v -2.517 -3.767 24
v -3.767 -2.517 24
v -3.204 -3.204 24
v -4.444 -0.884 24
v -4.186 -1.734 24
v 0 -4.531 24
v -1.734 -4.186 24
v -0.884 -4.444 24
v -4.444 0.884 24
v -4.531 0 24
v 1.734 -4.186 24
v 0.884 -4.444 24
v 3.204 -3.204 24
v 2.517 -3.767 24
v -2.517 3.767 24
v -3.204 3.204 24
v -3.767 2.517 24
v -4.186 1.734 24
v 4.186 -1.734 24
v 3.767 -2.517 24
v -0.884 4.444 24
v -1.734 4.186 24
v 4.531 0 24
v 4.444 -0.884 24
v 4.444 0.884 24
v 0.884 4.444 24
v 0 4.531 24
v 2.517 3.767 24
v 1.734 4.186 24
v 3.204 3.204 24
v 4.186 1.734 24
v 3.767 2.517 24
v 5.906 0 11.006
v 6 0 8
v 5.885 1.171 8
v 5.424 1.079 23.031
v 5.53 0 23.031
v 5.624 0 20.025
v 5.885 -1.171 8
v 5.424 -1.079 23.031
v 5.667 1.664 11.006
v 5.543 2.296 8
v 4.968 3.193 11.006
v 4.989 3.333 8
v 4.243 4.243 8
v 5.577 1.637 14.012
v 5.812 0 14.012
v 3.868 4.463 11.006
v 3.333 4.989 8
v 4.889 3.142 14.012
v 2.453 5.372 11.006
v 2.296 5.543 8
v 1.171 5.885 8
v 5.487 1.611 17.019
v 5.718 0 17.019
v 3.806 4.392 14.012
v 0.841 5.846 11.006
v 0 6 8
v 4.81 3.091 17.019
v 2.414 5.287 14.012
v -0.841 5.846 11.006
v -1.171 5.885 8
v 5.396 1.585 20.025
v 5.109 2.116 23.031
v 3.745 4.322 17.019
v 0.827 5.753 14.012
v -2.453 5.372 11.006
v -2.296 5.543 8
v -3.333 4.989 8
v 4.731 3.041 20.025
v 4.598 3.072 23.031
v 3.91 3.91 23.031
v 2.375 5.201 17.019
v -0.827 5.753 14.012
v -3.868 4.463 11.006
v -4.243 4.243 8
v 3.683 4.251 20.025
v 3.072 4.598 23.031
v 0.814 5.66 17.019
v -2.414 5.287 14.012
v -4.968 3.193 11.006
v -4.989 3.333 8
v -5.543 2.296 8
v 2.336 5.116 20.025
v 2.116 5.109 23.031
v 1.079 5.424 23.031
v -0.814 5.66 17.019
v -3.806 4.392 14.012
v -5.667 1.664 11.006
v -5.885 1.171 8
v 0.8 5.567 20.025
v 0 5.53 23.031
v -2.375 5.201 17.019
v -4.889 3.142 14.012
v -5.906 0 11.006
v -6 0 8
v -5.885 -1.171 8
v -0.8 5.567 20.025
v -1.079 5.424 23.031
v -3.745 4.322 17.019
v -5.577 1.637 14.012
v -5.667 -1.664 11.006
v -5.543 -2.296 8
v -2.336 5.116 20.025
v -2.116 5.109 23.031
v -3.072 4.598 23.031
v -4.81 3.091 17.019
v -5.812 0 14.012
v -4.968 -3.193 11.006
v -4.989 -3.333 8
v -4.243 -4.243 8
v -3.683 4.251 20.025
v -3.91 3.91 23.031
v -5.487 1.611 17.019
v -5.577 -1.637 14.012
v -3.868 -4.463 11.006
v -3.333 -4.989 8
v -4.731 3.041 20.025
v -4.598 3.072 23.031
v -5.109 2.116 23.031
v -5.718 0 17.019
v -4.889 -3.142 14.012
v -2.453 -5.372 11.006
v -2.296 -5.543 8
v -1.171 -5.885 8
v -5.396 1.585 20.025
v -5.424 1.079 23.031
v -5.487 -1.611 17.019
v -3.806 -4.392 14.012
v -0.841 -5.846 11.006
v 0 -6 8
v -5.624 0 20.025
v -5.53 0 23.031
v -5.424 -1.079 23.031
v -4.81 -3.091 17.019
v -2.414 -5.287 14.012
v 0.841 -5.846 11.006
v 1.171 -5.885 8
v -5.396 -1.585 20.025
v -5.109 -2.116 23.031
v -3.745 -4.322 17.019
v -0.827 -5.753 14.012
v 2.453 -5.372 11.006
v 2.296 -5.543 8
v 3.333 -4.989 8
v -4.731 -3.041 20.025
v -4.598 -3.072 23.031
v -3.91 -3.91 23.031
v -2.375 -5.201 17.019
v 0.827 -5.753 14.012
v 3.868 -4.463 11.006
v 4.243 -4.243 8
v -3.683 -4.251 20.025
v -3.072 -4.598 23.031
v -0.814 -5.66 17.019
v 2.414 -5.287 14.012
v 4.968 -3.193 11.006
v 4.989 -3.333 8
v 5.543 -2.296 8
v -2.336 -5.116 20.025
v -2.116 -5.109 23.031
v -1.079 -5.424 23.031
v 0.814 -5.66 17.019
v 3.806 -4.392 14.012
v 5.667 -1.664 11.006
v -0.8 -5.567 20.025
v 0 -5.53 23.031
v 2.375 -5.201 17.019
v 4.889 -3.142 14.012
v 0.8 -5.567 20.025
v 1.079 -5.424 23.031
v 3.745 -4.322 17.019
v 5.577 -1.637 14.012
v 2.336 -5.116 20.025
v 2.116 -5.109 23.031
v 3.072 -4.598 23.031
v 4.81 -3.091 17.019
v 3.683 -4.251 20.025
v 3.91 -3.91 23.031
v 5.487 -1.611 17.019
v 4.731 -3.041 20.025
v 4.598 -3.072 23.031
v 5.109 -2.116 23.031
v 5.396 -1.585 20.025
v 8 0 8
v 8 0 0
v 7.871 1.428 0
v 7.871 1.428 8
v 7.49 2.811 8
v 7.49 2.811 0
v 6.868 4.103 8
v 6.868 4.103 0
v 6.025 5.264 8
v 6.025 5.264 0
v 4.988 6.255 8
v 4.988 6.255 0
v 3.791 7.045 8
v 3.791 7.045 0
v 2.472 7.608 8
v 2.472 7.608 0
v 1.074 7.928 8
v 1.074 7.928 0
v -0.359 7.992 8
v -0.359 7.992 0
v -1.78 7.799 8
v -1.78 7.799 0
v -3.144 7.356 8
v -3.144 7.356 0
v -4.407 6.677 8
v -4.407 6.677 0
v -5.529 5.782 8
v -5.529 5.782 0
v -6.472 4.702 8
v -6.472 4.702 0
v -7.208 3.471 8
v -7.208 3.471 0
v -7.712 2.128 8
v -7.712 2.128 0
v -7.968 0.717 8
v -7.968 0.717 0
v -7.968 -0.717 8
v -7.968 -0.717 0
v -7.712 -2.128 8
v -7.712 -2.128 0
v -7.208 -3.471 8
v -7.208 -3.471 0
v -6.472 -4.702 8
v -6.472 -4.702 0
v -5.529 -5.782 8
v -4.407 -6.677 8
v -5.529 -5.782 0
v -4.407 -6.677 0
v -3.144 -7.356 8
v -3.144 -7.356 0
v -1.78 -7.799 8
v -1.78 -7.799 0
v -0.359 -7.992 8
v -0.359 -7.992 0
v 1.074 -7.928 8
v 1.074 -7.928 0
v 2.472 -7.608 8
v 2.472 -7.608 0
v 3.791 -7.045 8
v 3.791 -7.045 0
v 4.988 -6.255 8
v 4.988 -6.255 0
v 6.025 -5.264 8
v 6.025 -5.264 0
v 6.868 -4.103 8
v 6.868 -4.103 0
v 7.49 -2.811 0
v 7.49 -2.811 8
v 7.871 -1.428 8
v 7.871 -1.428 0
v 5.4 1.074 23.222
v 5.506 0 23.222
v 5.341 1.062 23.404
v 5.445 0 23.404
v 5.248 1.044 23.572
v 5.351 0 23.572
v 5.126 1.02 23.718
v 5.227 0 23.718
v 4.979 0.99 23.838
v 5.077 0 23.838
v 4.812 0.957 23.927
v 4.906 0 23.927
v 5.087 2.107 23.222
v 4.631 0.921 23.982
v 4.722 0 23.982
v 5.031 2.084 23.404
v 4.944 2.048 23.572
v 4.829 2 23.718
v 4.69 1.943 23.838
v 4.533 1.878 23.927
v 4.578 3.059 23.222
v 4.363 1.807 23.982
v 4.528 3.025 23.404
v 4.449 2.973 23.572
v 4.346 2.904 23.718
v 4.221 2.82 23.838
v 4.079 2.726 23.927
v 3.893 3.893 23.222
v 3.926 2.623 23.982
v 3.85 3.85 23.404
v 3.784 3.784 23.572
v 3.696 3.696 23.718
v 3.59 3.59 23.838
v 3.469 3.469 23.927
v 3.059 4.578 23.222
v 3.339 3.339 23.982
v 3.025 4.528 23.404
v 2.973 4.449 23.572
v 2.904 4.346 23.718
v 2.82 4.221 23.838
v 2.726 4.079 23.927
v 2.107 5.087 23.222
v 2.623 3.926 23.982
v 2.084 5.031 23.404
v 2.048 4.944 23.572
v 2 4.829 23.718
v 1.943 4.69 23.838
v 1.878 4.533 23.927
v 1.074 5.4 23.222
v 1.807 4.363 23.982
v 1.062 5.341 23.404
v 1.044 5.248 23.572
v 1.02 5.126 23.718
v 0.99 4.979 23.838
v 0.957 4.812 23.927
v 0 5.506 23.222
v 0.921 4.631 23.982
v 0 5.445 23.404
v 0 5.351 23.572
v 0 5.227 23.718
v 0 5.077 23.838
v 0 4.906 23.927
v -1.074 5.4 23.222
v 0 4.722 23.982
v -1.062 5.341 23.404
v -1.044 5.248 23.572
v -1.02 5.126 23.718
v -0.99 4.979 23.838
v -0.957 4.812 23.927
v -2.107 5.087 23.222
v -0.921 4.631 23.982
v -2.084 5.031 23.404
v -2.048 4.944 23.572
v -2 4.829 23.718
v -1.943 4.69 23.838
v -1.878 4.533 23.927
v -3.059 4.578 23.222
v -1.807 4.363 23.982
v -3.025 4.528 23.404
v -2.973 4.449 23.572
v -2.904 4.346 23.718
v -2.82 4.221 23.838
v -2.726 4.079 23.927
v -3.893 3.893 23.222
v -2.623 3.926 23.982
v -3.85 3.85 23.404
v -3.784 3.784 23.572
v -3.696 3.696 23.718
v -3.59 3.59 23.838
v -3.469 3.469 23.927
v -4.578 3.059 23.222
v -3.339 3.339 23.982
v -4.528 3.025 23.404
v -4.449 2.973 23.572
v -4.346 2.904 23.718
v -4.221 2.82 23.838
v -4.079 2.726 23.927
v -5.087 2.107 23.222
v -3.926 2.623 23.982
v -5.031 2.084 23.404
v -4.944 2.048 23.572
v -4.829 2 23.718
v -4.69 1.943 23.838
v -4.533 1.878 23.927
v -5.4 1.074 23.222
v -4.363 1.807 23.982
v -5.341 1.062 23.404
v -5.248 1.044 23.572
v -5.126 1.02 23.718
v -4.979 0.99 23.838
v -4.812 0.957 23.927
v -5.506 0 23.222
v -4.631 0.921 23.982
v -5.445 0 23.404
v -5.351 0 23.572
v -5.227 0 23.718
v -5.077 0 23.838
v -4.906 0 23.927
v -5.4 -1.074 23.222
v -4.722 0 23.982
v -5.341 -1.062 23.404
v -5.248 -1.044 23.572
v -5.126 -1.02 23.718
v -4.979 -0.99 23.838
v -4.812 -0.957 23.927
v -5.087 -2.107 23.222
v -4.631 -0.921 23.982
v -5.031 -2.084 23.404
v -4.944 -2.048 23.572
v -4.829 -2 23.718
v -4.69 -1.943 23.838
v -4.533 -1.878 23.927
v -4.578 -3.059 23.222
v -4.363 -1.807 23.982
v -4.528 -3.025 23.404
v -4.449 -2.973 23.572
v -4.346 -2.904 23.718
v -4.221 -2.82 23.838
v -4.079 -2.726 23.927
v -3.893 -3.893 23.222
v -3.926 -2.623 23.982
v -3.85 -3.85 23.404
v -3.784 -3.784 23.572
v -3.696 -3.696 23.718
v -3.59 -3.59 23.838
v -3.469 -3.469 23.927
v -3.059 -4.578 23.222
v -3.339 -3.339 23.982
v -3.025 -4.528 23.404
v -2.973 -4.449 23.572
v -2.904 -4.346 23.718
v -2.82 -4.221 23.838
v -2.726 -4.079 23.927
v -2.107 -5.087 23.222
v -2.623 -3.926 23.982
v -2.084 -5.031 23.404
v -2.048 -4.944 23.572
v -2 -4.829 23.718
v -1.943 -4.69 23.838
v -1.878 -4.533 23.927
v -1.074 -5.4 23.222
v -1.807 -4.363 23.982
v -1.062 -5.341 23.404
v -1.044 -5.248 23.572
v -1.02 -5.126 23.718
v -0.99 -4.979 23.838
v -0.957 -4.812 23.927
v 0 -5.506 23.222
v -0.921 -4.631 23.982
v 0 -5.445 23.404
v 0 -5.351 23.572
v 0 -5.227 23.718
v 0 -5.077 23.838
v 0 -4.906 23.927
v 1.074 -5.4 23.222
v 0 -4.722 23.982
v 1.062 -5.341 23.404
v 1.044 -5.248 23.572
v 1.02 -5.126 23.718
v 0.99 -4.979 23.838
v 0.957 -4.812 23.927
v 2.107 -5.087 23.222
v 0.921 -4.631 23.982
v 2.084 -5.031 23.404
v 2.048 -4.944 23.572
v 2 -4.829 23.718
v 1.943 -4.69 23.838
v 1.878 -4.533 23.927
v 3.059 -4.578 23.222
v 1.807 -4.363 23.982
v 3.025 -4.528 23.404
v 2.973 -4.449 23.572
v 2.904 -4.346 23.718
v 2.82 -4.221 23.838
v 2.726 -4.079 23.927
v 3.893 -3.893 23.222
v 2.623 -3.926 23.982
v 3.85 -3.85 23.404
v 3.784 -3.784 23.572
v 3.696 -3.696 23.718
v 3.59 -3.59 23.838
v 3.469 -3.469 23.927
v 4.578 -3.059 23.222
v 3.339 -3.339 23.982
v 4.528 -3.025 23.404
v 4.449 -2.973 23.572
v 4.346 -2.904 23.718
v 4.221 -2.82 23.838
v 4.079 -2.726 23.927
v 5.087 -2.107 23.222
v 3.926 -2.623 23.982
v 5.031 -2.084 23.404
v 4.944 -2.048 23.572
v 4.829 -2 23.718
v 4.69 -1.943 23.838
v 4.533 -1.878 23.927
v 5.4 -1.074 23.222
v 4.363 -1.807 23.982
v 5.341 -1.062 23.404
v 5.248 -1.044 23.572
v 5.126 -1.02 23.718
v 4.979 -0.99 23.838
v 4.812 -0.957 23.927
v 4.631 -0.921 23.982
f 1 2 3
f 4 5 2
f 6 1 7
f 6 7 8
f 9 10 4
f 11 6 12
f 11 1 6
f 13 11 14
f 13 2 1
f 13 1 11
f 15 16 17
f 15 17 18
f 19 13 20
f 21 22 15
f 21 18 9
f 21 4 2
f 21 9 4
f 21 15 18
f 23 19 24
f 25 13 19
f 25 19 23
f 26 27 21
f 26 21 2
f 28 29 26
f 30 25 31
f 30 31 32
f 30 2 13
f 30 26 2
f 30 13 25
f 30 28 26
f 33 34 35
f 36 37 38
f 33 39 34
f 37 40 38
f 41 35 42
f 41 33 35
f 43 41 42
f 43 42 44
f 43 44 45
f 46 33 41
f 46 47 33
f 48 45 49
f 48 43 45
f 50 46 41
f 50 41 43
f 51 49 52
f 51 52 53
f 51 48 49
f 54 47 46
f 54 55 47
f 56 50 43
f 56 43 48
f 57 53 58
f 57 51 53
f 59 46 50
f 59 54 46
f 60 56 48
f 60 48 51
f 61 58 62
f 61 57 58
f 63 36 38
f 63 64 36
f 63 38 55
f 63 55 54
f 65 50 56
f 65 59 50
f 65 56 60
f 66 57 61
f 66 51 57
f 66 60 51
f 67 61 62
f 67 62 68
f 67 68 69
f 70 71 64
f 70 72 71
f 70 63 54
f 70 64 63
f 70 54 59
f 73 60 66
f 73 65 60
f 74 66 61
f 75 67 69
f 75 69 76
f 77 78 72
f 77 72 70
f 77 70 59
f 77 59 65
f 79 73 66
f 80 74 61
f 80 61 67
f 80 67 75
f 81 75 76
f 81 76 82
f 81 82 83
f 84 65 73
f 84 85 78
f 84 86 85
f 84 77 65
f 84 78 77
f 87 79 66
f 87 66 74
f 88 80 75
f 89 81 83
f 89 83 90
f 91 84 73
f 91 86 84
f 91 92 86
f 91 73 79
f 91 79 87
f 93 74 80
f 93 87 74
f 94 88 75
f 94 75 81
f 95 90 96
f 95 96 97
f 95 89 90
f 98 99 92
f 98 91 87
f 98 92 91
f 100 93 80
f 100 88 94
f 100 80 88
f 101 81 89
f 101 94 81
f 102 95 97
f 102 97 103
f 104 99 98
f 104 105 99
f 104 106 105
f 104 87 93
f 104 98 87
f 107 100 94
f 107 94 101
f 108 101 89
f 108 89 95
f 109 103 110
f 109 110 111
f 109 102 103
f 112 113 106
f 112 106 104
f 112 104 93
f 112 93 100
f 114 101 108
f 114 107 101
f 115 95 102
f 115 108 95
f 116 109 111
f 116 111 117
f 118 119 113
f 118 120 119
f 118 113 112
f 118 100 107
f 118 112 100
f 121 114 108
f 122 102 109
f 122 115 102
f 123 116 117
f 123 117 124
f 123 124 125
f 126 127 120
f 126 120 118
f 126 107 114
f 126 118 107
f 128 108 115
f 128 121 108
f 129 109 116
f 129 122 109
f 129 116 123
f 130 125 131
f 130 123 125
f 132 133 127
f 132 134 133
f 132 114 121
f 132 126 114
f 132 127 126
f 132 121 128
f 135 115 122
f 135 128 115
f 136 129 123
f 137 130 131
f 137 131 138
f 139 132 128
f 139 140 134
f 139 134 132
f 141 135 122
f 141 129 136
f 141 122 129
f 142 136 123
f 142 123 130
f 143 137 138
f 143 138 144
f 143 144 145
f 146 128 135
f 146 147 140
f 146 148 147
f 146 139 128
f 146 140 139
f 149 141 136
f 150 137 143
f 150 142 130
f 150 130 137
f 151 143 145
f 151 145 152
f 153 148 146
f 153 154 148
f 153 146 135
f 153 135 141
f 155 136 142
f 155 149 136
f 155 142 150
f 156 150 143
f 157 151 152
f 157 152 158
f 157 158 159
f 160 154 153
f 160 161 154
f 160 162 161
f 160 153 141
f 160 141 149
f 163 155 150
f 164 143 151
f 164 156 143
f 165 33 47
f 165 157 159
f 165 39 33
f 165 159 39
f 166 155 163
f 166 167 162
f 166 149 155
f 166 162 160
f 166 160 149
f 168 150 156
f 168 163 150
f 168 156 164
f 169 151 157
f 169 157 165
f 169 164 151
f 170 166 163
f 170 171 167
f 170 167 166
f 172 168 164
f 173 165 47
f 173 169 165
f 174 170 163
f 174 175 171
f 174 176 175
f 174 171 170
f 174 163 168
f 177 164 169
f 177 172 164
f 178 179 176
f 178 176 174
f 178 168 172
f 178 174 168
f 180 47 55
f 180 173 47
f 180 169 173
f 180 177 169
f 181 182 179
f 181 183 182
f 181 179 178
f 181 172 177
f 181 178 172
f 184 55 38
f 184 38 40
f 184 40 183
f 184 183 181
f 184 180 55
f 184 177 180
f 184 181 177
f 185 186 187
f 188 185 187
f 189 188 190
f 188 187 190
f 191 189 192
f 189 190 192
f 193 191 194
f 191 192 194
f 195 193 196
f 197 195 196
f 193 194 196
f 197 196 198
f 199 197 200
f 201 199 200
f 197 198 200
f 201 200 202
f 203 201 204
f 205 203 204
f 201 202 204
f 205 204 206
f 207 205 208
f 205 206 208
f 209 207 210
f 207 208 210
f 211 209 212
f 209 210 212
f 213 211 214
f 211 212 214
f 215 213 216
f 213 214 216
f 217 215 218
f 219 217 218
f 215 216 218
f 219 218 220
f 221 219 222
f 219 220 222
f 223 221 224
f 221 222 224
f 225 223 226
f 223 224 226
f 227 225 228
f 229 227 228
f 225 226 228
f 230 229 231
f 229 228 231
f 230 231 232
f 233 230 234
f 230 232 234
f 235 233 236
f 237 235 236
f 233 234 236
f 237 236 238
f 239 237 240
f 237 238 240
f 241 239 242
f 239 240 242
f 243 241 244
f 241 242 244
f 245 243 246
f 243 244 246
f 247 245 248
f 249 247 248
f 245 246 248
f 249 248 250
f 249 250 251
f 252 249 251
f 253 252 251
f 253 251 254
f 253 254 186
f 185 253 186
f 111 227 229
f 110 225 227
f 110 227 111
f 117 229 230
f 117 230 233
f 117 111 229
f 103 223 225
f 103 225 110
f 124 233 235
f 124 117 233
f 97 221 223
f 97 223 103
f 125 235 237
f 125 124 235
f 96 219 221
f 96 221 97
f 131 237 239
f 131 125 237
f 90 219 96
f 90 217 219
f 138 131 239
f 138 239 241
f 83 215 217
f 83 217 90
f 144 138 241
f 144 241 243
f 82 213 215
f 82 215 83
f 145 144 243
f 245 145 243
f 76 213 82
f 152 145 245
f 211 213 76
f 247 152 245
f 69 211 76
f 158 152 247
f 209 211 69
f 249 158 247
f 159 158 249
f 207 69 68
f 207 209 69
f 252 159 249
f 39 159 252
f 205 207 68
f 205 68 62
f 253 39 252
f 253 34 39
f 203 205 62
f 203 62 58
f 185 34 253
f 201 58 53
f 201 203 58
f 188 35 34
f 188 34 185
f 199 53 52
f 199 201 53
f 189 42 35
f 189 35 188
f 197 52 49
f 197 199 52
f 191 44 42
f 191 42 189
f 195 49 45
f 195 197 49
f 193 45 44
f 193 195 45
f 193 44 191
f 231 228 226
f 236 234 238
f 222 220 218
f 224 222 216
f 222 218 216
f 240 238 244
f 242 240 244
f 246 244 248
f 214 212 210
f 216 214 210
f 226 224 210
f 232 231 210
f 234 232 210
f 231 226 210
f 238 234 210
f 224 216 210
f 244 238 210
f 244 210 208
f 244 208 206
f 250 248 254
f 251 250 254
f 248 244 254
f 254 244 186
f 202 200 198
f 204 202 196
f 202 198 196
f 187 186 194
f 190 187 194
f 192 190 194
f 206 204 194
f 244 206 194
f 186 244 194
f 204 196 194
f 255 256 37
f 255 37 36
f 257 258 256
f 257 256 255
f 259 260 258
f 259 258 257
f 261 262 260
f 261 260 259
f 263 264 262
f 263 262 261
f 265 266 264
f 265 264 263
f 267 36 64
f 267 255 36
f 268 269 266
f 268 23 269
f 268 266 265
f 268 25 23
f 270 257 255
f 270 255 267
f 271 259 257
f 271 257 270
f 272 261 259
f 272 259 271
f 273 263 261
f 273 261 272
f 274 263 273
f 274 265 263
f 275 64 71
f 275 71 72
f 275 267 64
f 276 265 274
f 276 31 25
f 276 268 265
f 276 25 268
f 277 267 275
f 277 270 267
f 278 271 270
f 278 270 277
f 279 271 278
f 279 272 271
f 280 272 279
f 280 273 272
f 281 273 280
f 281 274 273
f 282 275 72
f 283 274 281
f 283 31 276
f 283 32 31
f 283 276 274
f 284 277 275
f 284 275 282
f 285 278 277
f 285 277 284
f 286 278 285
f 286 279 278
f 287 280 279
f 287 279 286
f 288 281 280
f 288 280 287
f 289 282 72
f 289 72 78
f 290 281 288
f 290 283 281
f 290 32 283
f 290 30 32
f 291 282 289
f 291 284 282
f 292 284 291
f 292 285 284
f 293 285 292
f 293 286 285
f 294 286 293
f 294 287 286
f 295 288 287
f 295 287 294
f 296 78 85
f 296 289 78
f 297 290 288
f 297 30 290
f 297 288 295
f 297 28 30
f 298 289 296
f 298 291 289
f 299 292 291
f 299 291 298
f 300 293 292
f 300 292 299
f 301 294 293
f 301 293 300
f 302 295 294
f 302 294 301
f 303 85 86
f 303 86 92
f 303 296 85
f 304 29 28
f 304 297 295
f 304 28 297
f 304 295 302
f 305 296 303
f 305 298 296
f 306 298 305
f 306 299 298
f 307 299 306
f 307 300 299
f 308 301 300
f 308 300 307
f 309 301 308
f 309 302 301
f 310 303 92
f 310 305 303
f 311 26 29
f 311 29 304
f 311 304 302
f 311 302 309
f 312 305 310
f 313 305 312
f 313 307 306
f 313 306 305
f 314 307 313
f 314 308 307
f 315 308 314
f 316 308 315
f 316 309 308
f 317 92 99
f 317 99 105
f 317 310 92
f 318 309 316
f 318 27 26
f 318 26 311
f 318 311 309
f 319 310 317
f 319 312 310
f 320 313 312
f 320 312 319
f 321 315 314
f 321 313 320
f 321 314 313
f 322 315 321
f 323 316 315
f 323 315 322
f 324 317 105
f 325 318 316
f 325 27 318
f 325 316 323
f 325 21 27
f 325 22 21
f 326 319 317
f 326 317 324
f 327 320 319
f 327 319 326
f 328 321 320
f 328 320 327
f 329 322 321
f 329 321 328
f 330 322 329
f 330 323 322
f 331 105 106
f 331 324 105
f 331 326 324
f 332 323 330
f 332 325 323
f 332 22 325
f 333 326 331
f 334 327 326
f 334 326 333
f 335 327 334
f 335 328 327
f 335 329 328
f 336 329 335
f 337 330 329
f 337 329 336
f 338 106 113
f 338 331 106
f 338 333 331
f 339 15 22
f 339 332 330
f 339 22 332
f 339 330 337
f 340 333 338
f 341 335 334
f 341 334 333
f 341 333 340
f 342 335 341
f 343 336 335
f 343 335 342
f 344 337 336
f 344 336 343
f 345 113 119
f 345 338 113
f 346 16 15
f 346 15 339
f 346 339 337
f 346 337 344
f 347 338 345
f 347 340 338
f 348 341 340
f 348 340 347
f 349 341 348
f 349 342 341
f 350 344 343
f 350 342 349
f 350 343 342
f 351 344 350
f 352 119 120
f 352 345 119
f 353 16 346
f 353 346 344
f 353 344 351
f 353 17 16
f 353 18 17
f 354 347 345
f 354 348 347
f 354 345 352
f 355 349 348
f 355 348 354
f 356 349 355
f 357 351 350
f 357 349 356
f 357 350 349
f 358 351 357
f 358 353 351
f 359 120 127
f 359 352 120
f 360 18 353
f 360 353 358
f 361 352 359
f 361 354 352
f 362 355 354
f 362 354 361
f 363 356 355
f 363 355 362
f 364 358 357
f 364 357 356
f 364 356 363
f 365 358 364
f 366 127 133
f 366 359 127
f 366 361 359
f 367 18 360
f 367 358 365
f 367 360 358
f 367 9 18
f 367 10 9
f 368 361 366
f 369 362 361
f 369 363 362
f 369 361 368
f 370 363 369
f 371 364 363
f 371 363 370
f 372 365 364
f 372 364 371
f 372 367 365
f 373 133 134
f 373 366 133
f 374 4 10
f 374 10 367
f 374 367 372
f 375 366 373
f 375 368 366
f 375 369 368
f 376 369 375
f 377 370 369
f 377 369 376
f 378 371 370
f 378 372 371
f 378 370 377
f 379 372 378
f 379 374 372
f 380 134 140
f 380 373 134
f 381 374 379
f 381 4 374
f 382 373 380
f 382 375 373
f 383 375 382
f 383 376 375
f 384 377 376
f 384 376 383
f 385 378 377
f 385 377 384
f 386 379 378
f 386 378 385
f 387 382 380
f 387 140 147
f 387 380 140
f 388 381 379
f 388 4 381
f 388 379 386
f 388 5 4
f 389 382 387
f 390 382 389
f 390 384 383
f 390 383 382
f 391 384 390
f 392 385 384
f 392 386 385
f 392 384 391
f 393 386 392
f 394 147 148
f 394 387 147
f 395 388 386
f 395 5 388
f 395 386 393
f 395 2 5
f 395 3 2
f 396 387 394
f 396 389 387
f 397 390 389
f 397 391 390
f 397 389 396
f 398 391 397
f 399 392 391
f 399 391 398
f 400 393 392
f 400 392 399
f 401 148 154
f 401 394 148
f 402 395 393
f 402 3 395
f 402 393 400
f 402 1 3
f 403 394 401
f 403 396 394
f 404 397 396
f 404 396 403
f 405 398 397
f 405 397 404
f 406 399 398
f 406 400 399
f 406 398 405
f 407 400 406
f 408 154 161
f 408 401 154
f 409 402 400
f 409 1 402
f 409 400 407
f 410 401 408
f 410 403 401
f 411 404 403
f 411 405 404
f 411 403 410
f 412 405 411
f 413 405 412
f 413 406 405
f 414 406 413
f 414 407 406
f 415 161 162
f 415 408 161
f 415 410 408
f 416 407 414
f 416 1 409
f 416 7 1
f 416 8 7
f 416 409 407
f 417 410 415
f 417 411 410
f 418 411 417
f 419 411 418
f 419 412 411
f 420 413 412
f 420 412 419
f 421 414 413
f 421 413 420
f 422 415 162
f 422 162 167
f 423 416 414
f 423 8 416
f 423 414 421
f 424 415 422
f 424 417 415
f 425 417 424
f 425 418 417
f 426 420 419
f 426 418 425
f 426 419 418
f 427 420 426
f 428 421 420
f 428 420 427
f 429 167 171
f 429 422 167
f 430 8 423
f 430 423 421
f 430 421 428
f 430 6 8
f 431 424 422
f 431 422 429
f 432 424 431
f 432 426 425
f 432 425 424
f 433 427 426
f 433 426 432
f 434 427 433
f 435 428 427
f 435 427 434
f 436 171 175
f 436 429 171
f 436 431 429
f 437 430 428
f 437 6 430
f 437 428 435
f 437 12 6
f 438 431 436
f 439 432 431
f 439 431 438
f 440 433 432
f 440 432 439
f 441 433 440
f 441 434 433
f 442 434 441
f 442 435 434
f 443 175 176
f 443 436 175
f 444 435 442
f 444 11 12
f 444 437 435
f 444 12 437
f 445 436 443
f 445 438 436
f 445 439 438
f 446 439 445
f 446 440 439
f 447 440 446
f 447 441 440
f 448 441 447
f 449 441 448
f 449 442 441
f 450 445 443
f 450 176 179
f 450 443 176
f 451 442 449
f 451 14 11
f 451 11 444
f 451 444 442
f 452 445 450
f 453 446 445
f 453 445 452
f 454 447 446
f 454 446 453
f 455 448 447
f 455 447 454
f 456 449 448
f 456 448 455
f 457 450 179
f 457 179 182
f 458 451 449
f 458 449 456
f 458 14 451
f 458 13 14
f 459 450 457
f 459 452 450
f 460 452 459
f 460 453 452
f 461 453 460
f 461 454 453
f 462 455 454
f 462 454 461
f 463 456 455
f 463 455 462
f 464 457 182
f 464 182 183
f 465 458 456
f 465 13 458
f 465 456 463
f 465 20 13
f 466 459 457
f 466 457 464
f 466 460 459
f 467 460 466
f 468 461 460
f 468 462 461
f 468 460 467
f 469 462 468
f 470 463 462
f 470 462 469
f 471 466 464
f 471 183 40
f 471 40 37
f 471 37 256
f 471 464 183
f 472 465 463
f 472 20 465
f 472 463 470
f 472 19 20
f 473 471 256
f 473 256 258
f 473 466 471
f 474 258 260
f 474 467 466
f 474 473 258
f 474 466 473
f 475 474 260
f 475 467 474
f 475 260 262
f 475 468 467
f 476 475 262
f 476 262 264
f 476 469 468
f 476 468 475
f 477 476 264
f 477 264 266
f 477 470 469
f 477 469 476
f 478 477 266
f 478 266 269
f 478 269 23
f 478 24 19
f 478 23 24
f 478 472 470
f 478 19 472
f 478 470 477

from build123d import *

# Parameters (mm, degrees)
F0_R     = 8
F1_DEPTH = 8
F2_R     = 6
F4_R     = 5.5
F6_R     = 1


with BuildPart() as f1:
    # F0 (on Top) → F1 (new body)
    with BuildSketch(Plane.XY):
        Circle(F0_R)
    extrude(amount=F1_DEPTH)

    # F2 (on face) → F5 section 0
    with BuildSketch(Plane.XY.offset(8)):
        Circle(F2_R)
    # F4 (on offset) → F5 section 1
    with BuildSketch(Plane.XY.offset(24)):
        Circle(F4_R)
    loft()

    # F6
    f6_edges = [f1.edges().sort_by_distance(p)[0] for p in [
        (-5.5, 0, 24),
    ]]
    fillet(f6_edges, radius=F6_R)


solid = f1.part
